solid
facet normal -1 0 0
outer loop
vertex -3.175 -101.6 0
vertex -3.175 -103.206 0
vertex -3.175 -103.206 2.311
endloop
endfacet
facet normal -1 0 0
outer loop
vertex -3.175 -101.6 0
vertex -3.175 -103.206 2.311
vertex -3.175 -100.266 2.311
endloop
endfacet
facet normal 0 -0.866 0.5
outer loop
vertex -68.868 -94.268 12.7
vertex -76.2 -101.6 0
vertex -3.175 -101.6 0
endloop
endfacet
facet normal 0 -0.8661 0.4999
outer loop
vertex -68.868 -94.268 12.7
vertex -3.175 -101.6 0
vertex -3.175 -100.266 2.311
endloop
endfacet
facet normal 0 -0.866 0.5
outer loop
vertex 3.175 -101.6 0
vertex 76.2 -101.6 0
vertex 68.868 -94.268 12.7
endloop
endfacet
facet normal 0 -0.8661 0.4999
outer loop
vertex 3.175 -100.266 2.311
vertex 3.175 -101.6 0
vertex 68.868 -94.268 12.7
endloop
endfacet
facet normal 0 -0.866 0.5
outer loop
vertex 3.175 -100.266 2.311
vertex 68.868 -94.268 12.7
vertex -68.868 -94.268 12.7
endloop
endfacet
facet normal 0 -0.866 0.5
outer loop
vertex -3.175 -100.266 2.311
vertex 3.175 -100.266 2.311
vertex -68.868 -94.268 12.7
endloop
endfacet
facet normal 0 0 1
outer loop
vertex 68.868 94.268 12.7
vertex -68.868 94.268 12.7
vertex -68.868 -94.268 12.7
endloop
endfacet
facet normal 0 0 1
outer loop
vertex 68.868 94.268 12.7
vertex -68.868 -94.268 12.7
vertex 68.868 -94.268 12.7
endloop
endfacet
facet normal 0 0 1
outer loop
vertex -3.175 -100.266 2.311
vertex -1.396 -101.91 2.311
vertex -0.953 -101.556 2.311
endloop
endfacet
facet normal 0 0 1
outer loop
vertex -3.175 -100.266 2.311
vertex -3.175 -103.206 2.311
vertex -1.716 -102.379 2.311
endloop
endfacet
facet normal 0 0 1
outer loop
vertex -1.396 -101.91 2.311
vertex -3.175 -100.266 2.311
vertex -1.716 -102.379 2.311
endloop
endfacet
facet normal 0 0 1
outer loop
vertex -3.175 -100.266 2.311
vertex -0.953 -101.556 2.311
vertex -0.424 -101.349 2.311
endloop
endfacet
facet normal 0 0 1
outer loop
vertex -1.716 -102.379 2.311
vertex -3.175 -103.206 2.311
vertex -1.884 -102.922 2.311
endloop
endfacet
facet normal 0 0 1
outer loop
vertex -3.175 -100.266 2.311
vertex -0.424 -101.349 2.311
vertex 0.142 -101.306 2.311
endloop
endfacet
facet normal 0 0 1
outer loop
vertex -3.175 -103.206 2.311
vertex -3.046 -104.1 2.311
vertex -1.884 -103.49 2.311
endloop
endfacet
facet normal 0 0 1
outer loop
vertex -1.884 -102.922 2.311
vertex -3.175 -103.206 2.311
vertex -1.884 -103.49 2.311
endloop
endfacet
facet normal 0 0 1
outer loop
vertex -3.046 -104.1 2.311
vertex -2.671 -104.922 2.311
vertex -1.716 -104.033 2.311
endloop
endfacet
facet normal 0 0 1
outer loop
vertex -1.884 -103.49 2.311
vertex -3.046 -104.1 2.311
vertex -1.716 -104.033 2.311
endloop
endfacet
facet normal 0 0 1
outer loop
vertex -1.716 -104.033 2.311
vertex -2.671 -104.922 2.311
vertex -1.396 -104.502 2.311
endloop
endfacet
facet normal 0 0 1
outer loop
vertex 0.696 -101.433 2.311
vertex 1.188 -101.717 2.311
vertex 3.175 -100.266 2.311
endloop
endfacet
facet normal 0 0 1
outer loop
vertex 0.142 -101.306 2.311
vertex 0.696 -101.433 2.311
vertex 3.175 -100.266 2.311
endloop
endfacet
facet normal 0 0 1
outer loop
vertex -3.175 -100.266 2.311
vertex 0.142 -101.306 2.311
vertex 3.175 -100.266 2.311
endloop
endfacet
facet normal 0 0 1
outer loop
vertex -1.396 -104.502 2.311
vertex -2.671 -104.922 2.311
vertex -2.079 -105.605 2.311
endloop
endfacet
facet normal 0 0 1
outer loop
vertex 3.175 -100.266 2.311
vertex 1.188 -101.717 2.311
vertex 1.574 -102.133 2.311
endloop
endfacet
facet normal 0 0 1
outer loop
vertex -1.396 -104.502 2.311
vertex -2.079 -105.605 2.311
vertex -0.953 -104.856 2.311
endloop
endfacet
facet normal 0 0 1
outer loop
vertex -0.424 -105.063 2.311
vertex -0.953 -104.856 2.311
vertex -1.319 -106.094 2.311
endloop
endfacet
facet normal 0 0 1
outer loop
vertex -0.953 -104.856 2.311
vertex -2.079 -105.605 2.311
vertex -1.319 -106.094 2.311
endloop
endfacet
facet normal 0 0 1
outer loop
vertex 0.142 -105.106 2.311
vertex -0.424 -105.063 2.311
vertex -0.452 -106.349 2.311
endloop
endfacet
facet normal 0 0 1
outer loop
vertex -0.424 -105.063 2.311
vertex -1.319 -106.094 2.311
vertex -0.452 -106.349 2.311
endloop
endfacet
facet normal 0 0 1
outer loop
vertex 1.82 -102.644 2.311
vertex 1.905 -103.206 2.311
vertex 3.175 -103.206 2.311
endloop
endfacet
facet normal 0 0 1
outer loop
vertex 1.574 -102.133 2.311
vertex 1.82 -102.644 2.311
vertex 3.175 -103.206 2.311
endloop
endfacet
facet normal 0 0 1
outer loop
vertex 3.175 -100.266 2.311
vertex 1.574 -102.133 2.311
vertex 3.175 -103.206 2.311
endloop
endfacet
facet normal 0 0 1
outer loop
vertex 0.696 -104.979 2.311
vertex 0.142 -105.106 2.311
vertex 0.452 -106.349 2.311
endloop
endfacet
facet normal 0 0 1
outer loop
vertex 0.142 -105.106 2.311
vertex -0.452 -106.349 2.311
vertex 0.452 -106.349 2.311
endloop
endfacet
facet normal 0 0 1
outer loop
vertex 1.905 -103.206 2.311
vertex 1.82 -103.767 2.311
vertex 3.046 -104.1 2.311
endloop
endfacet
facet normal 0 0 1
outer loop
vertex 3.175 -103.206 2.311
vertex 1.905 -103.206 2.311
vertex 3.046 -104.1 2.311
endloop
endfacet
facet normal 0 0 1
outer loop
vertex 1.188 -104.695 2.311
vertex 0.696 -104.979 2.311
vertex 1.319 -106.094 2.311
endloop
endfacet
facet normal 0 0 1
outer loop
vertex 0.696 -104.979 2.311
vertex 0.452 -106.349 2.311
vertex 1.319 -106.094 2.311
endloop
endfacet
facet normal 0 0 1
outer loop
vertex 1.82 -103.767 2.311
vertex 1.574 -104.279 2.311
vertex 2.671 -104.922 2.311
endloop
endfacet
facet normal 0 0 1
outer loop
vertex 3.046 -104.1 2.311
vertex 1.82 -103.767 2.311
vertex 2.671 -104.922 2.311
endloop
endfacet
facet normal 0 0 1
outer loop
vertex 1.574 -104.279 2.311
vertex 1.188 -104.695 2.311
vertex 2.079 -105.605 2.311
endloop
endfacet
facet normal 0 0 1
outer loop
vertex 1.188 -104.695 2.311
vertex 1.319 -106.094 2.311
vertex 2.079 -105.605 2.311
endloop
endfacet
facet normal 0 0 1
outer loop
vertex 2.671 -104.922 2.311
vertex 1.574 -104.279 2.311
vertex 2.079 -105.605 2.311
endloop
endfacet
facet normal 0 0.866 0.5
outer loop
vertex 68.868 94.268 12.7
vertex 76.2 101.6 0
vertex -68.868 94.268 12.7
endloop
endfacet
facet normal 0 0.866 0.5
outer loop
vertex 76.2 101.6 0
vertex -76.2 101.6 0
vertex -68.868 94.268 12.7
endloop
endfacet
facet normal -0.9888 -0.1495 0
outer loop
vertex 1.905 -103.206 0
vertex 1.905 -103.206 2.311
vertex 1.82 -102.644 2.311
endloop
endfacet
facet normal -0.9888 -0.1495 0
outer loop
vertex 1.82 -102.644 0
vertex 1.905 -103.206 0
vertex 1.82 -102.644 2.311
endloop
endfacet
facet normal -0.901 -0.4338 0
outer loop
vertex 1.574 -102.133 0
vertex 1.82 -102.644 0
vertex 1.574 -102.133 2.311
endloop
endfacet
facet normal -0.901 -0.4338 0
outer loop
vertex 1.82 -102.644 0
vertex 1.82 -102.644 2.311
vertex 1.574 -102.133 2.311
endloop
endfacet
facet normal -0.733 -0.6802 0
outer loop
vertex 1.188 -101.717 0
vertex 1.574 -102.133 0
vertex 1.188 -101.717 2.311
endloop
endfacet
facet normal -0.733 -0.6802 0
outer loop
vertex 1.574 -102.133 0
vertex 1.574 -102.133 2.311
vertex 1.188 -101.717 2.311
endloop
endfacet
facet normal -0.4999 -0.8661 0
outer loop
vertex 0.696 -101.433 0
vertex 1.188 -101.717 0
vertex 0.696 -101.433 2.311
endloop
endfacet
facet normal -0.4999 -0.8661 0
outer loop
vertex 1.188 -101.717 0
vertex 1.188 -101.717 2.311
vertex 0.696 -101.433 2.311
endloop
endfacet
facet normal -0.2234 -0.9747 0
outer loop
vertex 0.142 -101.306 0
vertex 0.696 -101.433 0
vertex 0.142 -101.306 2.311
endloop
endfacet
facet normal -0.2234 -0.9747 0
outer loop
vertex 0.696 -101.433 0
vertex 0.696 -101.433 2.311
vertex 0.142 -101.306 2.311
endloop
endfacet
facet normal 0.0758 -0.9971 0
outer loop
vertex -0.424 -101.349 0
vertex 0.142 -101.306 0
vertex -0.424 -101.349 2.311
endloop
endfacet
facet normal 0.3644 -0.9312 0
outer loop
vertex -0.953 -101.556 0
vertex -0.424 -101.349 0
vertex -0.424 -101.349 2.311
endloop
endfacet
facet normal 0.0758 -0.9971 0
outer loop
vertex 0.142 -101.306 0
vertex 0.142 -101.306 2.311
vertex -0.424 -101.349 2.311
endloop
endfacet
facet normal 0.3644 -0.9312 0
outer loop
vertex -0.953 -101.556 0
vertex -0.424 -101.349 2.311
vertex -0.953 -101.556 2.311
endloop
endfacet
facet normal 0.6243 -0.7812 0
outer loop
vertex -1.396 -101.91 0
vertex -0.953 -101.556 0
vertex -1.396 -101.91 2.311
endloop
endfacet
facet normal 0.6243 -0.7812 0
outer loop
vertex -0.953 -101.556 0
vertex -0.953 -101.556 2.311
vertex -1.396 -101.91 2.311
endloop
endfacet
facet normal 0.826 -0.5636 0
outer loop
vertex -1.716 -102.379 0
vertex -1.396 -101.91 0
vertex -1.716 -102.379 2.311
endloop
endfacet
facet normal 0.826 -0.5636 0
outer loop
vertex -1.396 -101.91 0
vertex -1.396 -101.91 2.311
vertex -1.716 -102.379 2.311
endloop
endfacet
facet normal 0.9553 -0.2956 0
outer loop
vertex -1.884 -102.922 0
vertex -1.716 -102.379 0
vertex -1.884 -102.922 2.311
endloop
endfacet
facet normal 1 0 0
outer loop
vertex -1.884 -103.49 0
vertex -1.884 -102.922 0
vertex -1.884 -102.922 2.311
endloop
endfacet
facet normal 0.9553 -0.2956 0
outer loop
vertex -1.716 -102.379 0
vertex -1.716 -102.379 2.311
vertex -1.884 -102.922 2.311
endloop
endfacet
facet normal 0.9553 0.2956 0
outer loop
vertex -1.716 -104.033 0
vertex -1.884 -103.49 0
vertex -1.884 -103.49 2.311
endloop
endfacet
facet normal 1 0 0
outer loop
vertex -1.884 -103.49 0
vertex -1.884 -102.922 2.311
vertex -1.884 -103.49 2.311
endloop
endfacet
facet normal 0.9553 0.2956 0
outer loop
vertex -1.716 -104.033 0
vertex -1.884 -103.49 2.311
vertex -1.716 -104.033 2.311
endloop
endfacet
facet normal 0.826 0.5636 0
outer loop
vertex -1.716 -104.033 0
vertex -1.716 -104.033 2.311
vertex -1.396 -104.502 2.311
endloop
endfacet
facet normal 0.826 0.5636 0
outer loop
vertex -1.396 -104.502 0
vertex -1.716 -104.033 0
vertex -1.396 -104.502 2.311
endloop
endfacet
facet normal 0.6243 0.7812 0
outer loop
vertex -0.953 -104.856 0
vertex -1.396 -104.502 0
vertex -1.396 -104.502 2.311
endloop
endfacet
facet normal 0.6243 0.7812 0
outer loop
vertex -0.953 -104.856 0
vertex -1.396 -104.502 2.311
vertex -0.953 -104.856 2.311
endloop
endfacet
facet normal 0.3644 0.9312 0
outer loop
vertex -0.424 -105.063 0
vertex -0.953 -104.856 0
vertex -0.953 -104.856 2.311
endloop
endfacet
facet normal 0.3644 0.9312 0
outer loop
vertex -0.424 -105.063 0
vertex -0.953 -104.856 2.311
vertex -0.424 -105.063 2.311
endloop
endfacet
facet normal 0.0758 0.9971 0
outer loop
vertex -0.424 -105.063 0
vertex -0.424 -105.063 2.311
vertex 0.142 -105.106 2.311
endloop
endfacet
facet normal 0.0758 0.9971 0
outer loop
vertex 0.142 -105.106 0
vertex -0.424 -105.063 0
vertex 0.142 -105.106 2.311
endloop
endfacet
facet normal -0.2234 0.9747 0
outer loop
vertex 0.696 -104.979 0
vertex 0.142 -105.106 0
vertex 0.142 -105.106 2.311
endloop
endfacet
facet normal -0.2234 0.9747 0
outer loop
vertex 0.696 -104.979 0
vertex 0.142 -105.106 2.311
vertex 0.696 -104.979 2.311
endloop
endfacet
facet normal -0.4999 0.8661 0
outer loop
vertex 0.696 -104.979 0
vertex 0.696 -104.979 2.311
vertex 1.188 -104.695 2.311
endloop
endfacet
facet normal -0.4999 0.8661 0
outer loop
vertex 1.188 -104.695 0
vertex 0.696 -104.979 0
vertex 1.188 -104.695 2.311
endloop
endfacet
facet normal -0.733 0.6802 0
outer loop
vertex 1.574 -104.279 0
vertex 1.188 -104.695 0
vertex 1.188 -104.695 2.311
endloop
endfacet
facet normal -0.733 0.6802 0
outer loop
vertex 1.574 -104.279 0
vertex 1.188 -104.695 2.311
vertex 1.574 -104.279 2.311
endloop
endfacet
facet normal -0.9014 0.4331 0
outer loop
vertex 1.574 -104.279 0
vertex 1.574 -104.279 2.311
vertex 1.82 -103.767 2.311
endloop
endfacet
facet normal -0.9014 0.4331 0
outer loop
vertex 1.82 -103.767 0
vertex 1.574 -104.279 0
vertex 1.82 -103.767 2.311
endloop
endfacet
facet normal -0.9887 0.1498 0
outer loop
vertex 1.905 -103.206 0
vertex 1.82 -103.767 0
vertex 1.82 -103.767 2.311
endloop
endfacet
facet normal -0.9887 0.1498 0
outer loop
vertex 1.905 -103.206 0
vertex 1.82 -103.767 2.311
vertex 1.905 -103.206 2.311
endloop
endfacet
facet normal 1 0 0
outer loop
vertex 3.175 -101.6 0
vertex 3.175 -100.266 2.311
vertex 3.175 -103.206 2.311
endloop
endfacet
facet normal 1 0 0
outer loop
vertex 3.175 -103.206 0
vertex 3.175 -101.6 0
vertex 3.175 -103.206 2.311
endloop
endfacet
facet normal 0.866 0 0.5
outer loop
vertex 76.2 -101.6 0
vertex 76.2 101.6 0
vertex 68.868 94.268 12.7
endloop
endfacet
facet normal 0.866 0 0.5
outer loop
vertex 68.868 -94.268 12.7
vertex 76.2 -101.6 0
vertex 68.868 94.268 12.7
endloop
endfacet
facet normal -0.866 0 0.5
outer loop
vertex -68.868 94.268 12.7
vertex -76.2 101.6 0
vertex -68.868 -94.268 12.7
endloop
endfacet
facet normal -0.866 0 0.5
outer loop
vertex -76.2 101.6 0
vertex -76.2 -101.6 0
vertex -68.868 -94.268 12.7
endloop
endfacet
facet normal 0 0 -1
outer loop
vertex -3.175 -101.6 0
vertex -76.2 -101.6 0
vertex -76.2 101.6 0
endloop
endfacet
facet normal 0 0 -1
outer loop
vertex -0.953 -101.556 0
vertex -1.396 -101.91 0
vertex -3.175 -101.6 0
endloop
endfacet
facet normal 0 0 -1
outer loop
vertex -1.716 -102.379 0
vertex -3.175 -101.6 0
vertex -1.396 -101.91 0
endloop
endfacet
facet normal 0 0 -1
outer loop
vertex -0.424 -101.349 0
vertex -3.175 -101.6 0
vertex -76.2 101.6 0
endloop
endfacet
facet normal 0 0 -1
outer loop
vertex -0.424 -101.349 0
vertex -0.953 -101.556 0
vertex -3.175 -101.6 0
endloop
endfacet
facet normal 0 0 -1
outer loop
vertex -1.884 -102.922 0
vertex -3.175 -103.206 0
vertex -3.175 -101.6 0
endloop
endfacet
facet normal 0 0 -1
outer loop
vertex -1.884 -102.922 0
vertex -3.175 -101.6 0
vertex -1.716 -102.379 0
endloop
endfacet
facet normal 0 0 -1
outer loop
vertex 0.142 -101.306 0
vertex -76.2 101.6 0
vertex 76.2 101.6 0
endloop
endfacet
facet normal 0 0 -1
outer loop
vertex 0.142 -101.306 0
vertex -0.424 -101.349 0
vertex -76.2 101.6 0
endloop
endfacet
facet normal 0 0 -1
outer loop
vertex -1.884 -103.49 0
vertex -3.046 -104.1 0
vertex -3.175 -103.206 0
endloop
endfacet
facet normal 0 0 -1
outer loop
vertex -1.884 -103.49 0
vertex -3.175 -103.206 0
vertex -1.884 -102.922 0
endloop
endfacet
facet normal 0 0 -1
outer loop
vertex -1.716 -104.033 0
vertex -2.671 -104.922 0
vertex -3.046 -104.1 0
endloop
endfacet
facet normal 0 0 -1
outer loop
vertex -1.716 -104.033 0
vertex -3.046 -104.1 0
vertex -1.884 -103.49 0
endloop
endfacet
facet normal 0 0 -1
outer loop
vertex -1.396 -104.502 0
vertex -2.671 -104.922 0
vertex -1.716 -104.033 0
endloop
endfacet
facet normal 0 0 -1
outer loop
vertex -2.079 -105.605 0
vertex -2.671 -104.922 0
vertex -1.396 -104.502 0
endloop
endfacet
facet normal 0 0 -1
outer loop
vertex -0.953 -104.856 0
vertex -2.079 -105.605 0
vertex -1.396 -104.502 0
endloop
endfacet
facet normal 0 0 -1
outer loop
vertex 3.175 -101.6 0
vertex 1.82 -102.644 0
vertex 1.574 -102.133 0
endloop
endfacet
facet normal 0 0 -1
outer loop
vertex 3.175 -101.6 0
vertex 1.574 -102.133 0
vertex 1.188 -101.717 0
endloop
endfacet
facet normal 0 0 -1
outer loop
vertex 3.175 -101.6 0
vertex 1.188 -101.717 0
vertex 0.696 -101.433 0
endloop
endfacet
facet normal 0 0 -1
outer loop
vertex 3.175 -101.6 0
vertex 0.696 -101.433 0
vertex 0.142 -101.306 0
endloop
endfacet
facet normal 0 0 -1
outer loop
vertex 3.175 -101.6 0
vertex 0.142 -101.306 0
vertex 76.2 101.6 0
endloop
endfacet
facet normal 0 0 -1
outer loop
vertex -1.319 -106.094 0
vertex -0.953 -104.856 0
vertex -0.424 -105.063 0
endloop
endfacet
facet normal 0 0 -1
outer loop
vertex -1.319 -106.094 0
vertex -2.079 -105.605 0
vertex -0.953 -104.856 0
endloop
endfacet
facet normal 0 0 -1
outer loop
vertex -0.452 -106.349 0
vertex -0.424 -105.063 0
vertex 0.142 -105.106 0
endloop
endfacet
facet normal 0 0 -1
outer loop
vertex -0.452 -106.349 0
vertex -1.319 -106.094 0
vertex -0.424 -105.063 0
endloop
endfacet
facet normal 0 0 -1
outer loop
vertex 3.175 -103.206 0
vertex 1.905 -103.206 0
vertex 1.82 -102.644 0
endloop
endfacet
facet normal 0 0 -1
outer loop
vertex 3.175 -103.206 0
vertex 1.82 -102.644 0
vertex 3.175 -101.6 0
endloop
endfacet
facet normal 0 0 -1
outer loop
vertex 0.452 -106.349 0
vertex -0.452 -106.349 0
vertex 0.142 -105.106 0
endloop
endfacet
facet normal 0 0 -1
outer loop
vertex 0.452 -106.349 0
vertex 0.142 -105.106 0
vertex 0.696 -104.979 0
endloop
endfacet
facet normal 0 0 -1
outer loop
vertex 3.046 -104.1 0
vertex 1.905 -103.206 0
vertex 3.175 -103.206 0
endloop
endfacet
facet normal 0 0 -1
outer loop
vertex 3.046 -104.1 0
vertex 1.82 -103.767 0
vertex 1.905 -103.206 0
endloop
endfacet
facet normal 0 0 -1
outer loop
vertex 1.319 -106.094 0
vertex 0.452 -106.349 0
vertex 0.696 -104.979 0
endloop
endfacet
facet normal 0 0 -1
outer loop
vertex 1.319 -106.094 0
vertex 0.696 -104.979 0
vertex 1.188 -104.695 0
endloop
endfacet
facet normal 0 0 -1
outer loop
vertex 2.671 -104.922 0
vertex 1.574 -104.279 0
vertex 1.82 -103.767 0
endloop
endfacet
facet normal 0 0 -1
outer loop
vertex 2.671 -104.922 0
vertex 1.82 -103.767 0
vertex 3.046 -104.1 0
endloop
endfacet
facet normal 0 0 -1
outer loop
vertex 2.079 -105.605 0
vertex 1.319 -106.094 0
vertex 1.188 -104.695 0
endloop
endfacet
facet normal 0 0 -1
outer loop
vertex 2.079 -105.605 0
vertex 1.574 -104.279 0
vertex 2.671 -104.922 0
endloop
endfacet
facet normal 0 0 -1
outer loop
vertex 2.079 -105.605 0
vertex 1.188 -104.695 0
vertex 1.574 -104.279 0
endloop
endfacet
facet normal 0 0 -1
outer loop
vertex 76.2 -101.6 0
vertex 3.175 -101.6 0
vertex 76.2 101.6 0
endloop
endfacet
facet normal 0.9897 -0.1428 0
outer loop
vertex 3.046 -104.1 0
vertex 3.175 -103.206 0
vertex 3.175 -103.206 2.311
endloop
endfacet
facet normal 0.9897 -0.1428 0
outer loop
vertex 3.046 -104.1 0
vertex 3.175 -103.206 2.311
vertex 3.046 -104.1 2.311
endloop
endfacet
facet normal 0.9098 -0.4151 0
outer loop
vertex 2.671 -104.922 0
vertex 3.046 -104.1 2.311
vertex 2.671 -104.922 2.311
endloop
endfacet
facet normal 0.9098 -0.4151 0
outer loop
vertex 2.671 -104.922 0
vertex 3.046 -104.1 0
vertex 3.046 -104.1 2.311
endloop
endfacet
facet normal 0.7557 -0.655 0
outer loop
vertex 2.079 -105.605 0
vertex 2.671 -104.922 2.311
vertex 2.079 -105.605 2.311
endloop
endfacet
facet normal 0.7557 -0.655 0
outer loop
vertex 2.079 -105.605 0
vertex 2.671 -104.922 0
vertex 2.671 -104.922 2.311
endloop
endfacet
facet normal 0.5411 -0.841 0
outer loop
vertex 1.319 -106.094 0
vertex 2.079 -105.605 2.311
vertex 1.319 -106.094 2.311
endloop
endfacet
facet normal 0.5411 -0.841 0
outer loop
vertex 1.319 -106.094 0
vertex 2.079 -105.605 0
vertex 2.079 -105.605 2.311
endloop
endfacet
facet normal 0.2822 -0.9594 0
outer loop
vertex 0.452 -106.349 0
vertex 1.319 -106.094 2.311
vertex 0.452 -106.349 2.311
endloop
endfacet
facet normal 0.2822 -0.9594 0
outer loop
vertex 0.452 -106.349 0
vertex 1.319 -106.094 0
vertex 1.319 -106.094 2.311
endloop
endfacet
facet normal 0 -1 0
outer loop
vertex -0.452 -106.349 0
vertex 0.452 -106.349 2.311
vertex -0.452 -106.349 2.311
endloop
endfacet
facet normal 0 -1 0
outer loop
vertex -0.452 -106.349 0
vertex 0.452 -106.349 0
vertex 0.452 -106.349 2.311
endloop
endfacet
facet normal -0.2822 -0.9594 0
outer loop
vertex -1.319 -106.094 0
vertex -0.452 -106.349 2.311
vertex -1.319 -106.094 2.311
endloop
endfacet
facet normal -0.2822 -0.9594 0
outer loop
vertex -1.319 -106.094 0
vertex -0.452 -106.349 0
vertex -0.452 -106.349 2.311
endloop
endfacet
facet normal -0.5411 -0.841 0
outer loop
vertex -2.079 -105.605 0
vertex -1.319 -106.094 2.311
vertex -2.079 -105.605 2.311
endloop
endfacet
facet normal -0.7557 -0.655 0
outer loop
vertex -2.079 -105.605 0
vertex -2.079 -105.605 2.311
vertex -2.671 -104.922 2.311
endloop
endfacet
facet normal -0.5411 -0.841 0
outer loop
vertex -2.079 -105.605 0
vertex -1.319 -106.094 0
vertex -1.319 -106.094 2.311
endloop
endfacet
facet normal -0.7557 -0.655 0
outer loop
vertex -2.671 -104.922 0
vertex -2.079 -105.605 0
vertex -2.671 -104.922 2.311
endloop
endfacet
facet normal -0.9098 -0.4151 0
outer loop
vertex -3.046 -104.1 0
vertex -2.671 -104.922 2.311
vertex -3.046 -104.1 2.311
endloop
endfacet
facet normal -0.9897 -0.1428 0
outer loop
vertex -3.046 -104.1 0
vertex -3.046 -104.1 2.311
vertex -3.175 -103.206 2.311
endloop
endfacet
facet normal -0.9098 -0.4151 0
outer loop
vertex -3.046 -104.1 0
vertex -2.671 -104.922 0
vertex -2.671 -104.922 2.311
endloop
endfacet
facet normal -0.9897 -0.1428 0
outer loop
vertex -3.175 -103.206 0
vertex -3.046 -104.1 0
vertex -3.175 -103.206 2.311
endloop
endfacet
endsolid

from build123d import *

# Parameters (mm, degrees)
F0_W     = 152.4
F0_H     = 203.2
F1_DEPTH = 12.7
F1_TAPER = 30
F2_W     = 6.35
F2_H     = 1.5690360503
F3_DEPTH = 2.3114
F4_R     = 1.905
F5_DEPTH = 25.4


with BuildPart() as f1:
    # F0 (on Top) → F1 (new body)
    with BuildSketch(Plane.XY):
        Rectangle(F0_W, F0_H)
    extrude(amount=F1_DEPTH, taper=F1_TAPER)

    # F2 (on face) → F3 (join)
    with BuildSketch(Plane(origin=(0, 0, 0), x_dir=(1, 0, 0), z_dir=(0, 0, -1))):
        with BuildLine():
            Line((-3.175, 101.6), (3.175, 101.6))
            Line((3.175, 101.6), (3.175, 103.2059639497))
            ThreePointArc((3.175, 103.2059639497), (1.125e-07, 106.3809639692), (-3.175, 103.2059641746))
            Line((-3.175, 103.2059641746), (-3.175, 101.6))
        make_face()
        with Locations((0, 100.8154819748)):
            Rectangle(F2_W, F2_H)
    extrude(amount=-F3_DEPTH)

    # F4 (on face) → F5 (cut)
    with BuildSketch(Plane.XY.offset(2.3114)):
        with Locations((0, -103.2059639692)):
            Circle(F4_R)
    extrude(amount=-F5_DEPTH, mode=Mode.SUBTRACT)


solid = f1.part
